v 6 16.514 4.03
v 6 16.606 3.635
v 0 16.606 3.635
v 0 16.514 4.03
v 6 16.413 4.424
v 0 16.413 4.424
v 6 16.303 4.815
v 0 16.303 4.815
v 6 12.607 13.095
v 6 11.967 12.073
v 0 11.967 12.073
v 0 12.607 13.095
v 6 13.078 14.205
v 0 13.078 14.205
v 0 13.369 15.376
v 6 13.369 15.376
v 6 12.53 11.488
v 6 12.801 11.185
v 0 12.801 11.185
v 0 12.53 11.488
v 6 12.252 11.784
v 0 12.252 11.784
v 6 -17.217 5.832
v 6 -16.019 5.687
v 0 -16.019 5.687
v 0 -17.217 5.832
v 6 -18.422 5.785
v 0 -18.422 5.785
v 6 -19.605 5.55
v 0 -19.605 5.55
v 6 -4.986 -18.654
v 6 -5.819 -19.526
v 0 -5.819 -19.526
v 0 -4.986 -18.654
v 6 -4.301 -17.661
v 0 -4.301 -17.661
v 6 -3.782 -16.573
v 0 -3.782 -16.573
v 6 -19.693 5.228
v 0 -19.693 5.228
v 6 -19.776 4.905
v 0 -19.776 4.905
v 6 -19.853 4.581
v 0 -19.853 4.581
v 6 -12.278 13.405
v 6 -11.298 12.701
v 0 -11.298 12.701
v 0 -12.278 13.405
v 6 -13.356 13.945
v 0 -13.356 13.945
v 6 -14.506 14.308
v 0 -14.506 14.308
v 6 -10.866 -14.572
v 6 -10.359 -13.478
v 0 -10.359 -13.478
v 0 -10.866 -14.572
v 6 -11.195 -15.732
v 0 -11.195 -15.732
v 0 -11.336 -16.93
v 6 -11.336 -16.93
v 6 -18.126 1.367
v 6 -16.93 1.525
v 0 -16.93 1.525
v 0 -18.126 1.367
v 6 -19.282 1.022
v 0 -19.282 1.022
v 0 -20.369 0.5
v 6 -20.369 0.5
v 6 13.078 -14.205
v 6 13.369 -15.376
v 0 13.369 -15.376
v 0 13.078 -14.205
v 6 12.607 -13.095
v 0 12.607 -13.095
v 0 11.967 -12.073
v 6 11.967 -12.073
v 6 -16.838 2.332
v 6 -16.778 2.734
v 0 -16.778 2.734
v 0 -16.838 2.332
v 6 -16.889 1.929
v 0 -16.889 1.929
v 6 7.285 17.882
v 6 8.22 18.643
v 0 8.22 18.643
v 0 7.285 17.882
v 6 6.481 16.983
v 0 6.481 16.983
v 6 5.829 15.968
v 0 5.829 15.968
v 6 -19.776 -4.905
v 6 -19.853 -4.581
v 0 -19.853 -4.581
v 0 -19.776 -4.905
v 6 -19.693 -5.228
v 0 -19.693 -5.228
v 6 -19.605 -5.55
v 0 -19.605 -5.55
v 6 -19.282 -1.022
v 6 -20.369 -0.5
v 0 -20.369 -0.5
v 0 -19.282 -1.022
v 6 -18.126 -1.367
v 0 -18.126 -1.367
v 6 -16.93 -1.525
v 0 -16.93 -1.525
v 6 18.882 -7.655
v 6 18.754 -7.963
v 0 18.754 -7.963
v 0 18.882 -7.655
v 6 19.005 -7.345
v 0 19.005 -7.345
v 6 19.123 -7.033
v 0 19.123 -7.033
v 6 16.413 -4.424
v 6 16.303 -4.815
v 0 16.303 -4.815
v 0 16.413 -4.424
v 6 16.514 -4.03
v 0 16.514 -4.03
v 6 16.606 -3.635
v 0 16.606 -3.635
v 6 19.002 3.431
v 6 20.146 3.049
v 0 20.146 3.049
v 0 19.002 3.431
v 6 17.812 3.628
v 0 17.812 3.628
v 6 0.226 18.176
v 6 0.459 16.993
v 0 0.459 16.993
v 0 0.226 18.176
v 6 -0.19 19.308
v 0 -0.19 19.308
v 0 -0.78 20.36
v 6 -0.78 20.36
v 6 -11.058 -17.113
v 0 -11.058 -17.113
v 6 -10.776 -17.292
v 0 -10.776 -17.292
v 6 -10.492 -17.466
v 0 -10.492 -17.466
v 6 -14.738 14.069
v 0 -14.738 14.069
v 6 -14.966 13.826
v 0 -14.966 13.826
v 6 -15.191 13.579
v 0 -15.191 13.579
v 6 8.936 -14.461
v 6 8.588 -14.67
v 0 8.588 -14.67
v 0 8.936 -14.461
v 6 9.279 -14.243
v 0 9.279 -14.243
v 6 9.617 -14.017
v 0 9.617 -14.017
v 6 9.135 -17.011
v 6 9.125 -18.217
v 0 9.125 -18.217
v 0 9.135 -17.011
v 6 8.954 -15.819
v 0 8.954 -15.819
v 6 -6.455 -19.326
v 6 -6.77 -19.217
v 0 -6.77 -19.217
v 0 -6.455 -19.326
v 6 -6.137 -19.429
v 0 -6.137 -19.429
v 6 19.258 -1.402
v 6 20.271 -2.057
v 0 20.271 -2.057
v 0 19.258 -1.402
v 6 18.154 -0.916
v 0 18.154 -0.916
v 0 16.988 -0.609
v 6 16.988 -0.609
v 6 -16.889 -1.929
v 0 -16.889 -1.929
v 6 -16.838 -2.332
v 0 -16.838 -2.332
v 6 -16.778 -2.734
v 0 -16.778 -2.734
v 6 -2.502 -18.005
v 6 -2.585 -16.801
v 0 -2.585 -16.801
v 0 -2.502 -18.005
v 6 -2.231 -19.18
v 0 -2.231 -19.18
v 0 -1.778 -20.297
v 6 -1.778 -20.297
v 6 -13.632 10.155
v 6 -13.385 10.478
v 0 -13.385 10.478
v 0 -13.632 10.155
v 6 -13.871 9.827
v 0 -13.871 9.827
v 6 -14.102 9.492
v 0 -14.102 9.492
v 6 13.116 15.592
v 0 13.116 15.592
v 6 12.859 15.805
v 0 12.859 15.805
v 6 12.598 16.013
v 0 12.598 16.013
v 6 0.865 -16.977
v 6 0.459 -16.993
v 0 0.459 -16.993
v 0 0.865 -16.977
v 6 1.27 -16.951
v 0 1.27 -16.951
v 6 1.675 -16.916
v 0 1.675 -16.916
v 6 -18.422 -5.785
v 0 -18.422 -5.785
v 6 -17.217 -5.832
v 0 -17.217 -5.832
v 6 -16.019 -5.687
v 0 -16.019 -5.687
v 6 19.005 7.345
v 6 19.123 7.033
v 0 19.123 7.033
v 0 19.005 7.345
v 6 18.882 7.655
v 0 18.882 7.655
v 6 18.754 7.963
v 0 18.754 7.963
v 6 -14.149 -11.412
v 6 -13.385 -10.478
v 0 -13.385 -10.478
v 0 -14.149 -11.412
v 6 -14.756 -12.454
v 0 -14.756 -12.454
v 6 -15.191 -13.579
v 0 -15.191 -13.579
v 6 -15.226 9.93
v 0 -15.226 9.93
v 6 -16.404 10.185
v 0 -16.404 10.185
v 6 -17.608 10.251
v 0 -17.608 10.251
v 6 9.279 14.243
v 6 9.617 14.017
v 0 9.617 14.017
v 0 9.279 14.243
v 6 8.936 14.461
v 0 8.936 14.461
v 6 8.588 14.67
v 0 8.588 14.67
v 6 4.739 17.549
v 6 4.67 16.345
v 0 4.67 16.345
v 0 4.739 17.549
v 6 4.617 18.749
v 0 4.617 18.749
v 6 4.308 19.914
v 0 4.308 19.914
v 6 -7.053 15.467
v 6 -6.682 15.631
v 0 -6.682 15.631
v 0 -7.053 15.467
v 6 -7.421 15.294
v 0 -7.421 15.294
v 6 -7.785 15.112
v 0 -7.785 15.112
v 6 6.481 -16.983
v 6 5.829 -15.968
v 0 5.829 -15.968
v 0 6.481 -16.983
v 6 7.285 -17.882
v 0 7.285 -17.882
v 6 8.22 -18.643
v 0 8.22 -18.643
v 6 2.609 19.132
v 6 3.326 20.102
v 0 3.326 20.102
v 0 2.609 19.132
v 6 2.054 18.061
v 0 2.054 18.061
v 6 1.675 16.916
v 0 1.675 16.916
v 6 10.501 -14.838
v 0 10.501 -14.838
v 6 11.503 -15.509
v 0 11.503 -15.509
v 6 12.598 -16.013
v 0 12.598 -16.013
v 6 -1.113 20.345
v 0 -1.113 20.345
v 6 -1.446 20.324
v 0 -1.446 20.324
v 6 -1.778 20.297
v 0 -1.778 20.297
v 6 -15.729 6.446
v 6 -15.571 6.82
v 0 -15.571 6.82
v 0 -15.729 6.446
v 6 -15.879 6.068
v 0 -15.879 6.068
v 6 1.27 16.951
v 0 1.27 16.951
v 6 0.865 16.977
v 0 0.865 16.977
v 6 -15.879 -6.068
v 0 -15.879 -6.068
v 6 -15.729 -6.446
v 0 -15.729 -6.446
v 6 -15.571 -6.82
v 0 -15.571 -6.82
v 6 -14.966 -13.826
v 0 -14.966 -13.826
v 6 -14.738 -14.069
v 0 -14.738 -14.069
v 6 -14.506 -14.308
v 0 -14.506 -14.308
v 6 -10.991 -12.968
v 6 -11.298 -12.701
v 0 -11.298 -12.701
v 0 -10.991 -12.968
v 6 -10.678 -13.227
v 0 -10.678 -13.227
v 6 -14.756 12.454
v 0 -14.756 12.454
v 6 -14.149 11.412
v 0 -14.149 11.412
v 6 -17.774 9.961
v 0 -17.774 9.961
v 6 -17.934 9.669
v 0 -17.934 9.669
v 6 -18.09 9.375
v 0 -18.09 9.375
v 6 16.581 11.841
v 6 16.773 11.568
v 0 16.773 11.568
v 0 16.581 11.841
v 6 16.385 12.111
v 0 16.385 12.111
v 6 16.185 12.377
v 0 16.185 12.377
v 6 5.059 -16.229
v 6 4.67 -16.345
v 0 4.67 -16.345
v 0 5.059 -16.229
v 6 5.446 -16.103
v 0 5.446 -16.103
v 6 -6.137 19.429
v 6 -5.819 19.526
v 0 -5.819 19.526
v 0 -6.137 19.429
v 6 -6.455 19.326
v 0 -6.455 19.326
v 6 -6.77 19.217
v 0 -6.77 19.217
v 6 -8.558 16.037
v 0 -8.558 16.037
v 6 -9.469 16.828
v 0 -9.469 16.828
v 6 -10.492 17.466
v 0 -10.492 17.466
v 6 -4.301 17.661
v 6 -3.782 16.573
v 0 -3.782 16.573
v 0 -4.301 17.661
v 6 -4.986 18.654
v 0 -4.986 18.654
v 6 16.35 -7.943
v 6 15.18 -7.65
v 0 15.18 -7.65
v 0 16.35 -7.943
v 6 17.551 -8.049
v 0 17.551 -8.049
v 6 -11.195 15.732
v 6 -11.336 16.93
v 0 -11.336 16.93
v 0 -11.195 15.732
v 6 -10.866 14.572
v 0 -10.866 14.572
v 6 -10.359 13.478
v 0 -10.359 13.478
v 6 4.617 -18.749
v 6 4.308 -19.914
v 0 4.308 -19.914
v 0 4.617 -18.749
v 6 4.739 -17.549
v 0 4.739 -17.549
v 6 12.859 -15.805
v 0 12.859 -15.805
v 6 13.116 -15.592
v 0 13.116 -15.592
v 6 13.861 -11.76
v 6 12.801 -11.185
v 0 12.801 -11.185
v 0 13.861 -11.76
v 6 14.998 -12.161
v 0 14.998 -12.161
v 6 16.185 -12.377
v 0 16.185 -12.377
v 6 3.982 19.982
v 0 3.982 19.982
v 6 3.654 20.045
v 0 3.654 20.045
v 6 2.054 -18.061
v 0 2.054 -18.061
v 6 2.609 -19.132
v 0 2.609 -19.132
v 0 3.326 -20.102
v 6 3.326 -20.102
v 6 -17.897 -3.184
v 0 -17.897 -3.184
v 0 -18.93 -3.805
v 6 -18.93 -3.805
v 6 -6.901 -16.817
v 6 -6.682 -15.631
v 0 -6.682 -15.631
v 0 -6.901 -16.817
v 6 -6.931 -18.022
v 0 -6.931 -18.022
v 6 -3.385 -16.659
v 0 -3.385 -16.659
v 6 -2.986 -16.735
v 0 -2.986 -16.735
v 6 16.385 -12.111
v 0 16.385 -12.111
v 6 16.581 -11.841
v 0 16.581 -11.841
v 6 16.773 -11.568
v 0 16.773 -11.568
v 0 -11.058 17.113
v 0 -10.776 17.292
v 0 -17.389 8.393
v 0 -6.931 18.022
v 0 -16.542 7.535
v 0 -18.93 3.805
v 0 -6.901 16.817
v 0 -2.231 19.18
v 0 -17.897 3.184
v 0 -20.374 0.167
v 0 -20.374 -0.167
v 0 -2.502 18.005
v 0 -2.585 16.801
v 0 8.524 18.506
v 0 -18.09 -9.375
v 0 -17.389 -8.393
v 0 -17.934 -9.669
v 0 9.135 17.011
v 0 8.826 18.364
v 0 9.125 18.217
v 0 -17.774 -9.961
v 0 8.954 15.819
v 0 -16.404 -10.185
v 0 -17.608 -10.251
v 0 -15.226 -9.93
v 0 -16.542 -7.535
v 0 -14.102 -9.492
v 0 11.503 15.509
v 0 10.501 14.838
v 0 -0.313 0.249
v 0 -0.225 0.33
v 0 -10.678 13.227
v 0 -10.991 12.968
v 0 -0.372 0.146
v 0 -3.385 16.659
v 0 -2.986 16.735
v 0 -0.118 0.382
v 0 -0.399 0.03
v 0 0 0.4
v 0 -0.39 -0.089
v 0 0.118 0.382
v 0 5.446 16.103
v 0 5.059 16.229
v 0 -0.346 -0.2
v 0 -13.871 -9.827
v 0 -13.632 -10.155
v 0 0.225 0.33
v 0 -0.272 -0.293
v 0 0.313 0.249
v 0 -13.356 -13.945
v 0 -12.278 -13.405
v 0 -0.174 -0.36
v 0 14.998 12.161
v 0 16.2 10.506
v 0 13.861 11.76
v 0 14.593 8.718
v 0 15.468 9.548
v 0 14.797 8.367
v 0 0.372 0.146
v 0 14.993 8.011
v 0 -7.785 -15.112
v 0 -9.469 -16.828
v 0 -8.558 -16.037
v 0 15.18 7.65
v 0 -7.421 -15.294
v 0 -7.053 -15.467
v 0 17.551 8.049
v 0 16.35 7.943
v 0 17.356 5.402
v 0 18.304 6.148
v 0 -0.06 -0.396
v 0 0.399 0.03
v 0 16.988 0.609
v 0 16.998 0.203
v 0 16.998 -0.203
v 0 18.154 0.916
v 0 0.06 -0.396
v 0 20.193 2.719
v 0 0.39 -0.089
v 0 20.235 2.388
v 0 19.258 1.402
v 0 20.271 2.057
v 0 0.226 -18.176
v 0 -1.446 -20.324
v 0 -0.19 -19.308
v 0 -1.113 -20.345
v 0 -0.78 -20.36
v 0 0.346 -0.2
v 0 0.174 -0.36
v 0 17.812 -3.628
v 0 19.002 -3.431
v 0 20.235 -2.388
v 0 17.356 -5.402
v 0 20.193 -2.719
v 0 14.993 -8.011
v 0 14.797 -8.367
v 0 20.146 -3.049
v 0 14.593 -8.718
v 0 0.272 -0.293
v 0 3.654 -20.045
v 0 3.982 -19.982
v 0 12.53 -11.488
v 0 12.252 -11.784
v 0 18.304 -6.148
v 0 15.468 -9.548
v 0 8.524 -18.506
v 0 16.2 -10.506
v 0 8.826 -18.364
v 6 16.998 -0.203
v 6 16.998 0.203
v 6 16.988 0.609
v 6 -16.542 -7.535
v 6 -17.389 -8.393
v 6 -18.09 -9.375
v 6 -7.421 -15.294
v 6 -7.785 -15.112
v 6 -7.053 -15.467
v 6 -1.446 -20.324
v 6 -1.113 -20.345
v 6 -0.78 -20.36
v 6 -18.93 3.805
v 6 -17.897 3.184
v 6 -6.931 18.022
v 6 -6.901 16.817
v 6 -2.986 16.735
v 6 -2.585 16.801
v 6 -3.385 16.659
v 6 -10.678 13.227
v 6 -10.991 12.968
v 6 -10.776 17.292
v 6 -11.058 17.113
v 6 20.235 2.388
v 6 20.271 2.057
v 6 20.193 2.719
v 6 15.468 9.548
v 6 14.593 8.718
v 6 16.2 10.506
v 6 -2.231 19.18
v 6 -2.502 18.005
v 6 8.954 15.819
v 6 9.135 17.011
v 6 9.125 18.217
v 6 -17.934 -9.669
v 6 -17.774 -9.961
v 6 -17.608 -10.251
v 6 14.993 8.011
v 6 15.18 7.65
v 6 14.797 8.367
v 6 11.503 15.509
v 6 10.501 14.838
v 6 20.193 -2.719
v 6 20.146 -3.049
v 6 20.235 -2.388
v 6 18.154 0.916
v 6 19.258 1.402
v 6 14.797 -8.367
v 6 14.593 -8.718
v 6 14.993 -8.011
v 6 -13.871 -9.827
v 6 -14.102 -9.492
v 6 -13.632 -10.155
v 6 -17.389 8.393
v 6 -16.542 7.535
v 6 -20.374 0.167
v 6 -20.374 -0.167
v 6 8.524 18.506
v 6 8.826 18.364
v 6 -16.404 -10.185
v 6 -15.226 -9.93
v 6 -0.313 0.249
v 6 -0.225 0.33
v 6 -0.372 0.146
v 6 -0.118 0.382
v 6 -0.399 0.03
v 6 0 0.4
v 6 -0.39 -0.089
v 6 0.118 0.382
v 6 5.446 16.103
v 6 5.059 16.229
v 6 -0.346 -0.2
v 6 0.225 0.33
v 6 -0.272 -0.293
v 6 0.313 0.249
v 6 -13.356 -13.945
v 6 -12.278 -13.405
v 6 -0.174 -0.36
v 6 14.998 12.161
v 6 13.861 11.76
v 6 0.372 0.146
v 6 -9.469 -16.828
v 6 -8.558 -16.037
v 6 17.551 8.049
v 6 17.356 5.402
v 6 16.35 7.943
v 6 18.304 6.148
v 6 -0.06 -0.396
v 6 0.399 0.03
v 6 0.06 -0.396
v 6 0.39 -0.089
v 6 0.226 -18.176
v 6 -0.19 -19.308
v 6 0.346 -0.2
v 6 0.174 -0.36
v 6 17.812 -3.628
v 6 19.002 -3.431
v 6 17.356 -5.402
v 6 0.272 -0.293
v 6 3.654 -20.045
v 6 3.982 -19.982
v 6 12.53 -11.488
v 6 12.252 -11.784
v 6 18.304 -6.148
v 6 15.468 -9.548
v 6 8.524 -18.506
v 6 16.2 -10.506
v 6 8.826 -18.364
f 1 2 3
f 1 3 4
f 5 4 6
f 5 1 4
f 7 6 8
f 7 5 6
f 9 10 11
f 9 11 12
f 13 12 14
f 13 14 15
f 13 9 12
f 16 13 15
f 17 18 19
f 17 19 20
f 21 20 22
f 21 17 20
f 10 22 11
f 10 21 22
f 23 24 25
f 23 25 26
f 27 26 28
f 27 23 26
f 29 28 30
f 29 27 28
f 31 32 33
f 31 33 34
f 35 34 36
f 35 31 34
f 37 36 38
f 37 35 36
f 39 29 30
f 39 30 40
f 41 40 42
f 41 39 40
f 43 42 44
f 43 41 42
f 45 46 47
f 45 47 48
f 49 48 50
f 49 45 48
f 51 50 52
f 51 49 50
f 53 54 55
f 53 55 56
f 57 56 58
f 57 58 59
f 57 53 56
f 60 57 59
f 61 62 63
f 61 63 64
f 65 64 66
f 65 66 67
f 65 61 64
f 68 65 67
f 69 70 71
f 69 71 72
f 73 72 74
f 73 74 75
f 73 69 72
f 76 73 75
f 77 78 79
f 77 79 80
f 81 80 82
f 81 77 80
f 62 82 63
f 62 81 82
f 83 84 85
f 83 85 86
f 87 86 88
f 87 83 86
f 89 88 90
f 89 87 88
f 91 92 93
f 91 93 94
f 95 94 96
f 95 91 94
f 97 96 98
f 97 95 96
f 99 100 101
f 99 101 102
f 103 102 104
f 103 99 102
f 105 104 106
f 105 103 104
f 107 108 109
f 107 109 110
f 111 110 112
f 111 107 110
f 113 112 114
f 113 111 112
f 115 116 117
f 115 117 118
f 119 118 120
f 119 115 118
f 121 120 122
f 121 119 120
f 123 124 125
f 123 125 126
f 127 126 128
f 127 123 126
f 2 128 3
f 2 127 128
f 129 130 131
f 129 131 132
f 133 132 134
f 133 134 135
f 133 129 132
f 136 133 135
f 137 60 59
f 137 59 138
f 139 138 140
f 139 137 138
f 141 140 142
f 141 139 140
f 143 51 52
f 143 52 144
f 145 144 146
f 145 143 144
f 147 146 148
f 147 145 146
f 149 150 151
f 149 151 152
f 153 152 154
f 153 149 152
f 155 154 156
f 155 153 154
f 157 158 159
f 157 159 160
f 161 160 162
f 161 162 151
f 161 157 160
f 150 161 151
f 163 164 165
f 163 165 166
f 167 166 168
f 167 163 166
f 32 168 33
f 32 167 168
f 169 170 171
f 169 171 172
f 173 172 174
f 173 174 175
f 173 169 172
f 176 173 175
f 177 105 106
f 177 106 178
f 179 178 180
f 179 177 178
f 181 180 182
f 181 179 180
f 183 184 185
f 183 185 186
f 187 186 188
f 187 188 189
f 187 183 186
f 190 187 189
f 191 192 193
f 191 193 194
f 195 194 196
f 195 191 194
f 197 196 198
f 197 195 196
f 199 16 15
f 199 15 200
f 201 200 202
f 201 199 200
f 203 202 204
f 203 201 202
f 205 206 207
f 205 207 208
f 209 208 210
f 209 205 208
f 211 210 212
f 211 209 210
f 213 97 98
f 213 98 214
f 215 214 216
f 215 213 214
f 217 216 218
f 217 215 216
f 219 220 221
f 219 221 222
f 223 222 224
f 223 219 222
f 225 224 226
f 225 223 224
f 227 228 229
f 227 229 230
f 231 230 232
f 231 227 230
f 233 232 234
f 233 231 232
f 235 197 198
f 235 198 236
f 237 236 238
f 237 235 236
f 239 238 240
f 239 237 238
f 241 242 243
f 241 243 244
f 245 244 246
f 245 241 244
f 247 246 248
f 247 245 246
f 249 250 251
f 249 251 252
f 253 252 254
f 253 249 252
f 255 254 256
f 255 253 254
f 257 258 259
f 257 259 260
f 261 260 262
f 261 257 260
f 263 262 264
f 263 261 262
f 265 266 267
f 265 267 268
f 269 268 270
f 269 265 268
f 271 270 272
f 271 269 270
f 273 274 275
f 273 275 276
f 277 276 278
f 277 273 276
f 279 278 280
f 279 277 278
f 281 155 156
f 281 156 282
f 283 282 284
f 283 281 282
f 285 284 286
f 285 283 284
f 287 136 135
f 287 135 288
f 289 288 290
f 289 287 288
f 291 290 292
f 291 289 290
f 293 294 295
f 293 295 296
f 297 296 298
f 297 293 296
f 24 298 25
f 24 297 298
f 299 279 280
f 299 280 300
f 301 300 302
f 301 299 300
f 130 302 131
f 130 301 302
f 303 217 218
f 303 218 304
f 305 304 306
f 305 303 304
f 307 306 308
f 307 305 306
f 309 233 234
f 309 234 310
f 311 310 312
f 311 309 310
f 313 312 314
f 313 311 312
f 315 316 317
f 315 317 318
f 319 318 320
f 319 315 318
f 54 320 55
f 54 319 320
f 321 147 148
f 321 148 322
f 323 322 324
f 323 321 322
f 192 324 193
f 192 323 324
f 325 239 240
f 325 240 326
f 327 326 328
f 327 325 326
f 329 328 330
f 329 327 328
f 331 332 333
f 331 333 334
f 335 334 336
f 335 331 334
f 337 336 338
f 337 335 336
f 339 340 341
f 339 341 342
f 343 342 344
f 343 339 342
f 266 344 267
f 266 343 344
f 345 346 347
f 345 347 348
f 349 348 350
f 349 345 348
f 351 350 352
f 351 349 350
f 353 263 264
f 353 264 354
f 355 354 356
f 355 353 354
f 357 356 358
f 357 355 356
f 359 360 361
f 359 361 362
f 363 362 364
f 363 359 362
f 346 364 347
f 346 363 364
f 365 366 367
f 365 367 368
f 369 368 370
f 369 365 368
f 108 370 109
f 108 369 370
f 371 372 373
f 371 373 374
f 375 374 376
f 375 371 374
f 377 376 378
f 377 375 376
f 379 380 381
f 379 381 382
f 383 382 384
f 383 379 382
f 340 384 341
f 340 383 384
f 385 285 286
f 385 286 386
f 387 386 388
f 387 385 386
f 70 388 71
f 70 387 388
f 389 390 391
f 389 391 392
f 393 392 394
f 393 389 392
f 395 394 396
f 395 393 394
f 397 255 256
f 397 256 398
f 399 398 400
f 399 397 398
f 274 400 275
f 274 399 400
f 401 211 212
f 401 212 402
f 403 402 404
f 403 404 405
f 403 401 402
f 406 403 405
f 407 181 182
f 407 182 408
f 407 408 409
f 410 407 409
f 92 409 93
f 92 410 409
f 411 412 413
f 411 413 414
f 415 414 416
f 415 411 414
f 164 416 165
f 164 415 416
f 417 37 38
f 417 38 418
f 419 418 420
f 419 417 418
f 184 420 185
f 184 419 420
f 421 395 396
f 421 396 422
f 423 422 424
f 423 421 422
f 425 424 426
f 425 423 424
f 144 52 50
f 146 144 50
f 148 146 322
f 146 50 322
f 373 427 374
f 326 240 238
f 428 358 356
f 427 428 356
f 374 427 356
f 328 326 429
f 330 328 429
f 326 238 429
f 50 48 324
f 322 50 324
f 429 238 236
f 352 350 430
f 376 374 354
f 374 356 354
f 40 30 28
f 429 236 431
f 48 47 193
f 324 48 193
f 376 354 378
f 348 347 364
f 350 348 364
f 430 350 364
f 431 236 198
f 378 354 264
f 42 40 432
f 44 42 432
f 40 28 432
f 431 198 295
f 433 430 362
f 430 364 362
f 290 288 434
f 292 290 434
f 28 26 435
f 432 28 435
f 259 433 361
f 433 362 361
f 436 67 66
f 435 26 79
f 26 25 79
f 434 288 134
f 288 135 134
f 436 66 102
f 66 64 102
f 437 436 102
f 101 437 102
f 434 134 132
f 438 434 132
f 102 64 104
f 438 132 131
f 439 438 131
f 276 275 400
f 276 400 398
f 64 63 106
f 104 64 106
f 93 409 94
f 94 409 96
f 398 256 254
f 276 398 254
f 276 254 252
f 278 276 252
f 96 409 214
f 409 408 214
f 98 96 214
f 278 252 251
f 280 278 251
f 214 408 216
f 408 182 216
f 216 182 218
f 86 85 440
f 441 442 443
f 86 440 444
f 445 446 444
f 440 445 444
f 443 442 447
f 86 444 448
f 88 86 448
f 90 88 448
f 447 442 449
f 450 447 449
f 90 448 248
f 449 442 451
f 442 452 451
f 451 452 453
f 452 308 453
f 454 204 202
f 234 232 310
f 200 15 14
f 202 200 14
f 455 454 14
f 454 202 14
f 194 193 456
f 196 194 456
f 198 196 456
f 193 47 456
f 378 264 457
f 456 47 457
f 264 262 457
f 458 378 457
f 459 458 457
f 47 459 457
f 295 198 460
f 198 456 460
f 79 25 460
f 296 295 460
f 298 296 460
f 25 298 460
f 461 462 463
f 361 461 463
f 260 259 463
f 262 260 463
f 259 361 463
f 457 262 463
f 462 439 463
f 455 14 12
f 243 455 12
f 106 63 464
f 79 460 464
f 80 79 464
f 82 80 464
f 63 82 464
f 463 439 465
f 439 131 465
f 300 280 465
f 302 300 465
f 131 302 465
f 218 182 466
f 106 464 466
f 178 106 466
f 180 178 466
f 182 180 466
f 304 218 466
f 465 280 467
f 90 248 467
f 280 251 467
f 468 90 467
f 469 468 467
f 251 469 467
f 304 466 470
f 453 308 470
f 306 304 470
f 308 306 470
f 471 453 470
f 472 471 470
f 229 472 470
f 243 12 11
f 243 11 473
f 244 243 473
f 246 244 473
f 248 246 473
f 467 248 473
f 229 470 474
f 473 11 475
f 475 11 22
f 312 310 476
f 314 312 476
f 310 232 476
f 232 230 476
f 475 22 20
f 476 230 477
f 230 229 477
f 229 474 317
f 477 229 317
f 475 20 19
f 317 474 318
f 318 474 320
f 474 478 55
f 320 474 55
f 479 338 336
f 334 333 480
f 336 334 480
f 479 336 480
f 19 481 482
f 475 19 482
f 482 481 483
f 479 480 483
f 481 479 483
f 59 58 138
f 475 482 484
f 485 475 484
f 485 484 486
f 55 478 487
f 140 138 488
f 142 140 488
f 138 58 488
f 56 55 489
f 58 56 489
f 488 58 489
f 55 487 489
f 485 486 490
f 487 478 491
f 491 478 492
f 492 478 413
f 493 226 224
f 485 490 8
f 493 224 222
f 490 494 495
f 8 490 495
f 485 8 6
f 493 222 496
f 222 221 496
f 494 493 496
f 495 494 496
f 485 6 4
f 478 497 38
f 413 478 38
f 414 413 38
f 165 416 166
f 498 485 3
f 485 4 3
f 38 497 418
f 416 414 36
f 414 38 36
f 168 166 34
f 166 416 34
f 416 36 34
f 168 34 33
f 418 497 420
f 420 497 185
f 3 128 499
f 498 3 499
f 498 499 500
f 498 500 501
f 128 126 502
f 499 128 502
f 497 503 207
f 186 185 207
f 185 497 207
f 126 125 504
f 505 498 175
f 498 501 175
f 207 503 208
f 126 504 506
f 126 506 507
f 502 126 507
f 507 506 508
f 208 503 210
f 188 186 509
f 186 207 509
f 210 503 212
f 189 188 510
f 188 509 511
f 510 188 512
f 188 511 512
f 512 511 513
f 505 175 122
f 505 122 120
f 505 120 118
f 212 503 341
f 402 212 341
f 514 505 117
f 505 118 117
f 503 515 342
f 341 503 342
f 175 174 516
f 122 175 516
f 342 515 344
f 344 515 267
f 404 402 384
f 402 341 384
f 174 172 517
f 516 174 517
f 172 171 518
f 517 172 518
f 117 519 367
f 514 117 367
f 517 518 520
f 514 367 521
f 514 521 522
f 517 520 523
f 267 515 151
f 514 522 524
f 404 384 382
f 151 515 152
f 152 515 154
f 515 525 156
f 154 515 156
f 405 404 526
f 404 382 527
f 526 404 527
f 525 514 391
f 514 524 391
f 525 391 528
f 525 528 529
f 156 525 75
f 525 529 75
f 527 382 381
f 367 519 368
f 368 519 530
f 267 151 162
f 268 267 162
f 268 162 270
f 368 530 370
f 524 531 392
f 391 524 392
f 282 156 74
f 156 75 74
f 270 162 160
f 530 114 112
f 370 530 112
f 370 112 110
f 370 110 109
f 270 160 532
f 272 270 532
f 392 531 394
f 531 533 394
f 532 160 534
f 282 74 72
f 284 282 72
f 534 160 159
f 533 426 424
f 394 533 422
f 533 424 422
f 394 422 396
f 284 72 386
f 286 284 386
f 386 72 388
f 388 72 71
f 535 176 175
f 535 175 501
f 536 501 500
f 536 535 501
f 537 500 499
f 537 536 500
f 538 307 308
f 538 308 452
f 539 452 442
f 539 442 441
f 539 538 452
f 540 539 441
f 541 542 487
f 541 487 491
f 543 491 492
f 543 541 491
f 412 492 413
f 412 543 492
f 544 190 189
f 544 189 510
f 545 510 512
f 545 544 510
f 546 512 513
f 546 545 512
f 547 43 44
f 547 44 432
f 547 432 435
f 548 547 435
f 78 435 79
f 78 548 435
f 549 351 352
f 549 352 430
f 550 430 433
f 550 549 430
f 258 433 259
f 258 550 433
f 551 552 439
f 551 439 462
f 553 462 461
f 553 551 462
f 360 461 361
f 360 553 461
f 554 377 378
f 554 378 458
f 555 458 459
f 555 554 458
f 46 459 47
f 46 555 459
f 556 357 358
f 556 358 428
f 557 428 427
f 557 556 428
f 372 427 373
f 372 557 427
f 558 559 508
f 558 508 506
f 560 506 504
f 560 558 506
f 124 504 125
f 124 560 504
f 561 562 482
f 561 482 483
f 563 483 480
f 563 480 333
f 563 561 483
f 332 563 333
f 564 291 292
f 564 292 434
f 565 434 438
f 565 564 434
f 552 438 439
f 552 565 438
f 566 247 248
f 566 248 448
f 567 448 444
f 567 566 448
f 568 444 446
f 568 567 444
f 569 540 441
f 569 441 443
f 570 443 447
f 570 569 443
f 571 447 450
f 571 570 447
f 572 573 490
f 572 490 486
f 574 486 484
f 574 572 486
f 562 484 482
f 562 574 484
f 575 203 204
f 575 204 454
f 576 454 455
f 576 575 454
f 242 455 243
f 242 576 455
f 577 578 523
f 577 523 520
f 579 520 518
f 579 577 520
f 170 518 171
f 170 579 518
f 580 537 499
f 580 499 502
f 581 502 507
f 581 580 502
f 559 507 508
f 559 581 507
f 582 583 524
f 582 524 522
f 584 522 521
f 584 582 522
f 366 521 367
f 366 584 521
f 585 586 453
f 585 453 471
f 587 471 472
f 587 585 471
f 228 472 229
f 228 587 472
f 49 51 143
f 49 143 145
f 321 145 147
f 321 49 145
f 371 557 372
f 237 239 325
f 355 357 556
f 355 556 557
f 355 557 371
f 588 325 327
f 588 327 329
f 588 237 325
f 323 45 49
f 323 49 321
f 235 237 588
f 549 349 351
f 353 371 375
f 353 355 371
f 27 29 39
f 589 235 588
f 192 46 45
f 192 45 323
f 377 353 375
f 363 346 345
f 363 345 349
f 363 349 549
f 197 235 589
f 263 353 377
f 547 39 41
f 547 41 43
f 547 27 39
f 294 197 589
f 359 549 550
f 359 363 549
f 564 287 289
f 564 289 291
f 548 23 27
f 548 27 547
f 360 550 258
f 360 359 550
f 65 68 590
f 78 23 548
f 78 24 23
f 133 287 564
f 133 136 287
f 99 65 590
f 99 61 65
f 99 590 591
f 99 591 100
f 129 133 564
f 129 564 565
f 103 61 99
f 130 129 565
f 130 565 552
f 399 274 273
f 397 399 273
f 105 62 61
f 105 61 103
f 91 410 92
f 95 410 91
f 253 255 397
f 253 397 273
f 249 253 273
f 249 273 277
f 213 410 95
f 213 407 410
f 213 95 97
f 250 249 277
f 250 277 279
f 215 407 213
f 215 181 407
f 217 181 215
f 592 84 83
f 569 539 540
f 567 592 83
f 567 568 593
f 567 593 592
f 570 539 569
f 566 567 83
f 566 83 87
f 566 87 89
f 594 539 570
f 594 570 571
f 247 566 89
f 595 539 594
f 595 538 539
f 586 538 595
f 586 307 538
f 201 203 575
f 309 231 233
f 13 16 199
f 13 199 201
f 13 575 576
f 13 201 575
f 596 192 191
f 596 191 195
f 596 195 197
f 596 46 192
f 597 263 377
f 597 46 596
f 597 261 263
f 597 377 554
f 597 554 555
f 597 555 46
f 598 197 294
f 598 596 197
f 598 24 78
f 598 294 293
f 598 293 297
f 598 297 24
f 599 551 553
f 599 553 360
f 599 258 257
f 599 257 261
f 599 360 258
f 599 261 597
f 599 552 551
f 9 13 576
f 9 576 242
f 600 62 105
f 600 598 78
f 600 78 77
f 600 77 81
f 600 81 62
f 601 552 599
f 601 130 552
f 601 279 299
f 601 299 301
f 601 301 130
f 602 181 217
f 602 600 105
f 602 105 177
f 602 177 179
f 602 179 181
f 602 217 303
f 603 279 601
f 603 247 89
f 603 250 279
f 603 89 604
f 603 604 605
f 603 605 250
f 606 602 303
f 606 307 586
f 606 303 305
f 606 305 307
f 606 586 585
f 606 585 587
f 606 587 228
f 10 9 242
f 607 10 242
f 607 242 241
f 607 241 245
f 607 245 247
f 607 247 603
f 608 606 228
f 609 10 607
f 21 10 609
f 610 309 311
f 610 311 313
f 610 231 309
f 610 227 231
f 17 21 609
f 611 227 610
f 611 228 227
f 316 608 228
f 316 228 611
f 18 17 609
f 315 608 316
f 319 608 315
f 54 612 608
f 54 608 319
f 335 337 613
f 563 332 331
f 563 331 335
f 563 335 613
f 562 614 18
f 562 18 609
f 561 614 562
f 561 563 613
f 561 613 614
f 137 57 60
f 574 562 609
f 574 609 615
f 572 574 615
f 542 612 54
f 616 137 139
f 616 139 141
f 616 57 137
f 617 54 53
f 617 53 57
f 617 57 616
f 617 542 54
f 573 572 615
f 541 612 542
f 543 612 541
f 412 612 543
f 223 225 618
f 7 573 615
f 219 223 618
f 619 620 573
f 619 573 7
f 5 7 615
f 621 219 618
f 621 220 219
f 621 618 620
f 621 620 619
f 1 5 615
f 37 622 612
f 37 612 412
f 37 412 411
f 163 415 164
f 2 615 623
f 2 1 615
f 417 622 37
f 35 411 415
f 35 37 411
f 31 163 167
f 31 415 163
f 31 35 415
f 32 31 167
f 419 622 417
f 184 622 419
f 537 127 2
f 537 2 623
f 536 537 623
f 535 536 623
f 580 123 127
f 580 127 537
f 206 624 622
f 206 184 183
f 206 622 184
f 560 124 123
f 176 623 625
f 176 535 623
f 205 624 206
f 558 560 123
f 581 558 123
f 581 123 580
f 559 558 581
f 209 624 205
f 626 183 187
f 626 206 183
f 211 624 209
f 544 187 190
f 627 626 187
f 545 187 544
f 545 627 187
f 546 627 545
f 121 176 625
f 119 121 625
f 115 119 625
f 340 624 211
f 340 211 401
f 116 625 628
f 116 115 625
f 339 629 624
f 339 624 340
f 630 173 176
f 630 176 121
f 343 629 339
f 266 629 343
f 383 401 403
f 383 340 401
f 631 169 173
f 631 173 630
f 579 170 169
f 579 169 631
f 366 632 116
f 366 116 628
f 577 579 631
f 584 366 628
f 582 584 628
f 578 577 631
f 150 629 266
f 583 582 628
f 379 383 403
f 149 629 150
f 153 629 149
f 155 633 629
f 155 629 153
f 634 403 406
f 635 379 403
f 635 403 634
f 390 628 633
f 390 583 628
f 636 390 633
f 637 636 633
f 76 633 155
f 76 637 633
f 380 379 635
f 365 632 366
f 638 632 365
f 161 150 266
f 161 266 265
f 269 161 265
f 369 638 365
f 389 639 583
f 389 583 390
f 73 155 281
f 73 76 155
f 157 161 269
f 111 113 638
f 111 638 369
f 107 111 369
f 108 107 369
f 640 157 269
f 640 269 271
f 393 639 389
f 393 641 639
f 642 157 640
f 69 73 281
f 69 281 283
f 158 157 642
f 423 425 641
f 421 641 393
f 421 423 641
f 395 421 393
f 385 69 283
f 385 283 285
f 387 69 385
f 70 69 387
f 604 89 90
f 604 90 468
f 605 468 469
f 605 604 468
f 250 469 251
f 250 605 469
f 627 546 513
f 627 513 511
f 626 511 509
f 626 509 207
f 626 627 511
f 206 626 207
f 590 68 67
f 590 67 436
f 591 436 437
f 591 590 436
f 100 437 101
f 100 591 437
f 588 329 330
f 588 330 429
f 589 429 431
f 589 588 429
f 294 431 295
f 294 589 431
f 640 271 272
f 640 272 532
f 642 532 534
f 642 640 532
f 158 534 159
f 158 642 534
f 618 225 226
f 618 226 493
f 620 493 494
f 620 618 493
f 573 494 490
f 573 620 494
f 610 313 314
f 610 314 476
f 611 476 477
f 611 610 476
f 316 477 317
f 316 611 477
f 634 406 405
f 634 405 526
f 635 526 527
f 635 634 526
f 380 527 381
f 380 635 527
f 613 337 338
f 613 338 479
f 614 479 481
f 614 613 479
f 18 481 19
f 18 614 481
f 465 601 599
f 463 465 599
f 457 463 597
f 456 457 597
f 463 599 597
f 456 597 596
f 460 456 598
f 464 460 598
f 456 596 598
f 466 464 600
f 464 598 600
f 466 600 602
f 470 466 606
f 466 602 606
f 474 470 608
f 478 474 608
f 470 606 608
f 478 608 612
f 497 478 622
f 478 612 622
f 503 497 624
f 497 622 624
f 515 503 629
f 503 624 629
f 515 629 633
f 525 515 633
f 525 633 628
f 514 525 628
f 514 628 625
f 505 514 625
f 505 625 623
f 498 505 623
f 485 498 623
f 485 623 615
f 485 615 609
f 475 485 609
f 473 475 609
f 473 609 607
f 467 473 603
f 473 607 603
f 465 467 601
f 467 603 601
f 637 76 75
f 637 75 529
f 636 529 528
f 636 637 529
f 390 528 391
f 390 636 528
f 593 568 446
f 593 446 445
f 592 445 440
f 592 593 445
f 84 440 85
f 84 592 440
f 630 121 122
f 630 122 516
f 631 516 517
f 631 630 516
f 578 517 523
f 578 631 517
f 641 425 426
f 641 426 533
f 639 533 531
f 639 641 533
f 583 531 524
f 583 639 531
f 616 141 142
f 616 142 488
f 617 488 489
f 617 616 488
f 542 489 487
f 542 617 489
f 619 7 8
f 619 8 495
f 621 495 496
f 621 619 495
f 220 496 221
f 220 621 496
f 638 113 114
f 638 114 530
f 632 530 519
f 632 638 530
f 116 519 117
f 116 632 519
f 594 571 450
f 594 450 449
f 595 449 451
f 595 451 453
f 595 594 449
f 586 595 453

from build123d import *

# Parameters (mm, degrees)
BASPROSKE_W         = 6
BASPROSKE_H         = 20.25
TOOTHCUT_DEPTH      = 30.259613805
TEETHCUTS_COUNT     = 25
TEETHCUTS_ANGLE     = 345.6
BORSKE_R            = 0.4
BORE_DEPTH          = 50.0000508
SKETCH1_R           = 0.4
BOSS_EXTRUDE1_DEPTH = 6


with BuildPart() as part:
    # BasProSke → Base-Revolve (revolve)
    with BuildSketch(Plane(origin=(0, 0, 0), x_dir=(1, 0, 0), z_dir=(0, 1, 0)), mode=Mode.PRIVATE) as base_revolve_sk:
        with Locations((3, 10.125)):
            Rectangle(BASPROSKE_W, BASPROSKE_H)
    revolve(base_revolve_sk.sketch.rotate(Axis((-10, 0, 0), (1, 0, 0)), 180), axis=Axis((-10, 0, 0), (1, 0, 0)))

    # TooCutSke → ToothCut (cut, through all)
    with BuildSketch(Plane(origin=(0, 0, 0), x_dir=(0, 0, -1), z_dir=(1, 0, 0))):
        with BuildLine():
            ThreePointArc((0.713909619, 16.858891098), (0, 16.874), (-0.713909619, 16.858891098))
            ThreePointArc((-0.713909619, 16.858891098), (-1.221902209, 18.597177626), (-2.131751691, 20.163022588))
            ThreePointArc((-2.131751691, 20.163022588), (0, 20.2754), (2.131751691, 20.163022588))
            ThreePointArc((2.131751691, 20.163022588), (1.221902209, 18.597177626), (0.713909619, 16.858891098))
        make_face()
    toothcut = extrude(amount=TOOTHCUT_DEPTH, mode=Mode.SUBTRACT)

    # TeethCuts: ToothCut ×25 about axis
    teethcuts_axis = Axis((-10, 0, 0), (1, 0, 0))
    for i in range(1, TEETHCUTS_COUNT):
        add(toothcut.rotate(teethcuts_axis, i * TEETHCUTS_ANGLE / (TEETHCUTS_COUNT - 1)), mode=Mode.SUBTRACT)

    # BorSke → Bore (cut, symmetric)
    with BuildSketch(Plane(origin=(0, 0, 0), x_dir=(0, 0, -1), z_dir=(1, 0, 0))):
        with Locations(Location((0, 0, 0), (0, 0, 180))):
            Circle(BORSKE_R)
    extrude(amount=BORE_DEPTH, both=True, mode=Mode.SUBTRACT)

    # Sketch1 → Boss-Extrude1 (add)
    with BuildSketch(Plane(origin=(6, 0, 0), x_dir=(0, 0, -1), z_dir=(1, 0, 0))):
        with BuildLine():
            ThreePointArc((7.033321313, 19.122578704), (5.755923301, 17.845039552), (4.814939591, 16.302832813))
            ThreePointArc((4.814939591, 16.302832813), (4.227479392, 16.464945156), (3.634585878, 16.605896136))
            ThreePointArc((3.634585878, 16.605896136), (3.55295933, 18.410664563), (3.049026099, 20.145571842))
            ThreePointArc((3.049026099, 20.145571842), (2.553664634, 20.214337039), (2.056764651, 20.270923614))
            ThreePointArc((2.056764651, 20.270923614), (1.137209513, 18.715844736), (0.609319757, 16.988076125))
            ThreePointArc((0.609319757, 16.988076125), (0, 16.999), (-0.609319757, 16.988076125))
            ThreePointArc((-0.609319757, 16.988076125), (-1.137209513, 18.715844736), (-2.056764651, 20.270923614))
            ThreePointArc((-2.056764651, 20.270923614), (-2.553664634, 20.214337039), (-3.049026099, 20.145571842))
            ThreePointArc((-3.049026099, 20.145571842), (-3.55295933, 18.410664563), (-3.634585878, 16.605896136))
            ThreePointArc((-3.634585878, 16.605896136), (-4.227479392, 16.464945156), (-4.814939591, 16.302832813))
            ThreePointArc((-4.814939591, 16.302832813), (-5.755923301, 17.845039552), (-7.033321313, 19.122578704))
            ThreePointArc((-7.033321313, 19.122578704), (-7.500537761, 18.9441959), (-7.963235326, 18.754399701))
            ThreePointArc((-7.963235326, 18.754399701), (-8.019882673, 16.948674626), (-7.650117116, 15.180306621))
            ThreePointArc((-7.650117116, 15.180306621), (-8.189330706, 14.896337254), (-8.718019063, 14.593222558))
            ThreePointArc((-8.718019063, 14.593222558), (-10.012971259, 15.852964904), (-11.567948531, 16.772691847))
            ThreePointArc((-11.567948531, 16.772691847), (-11.976124515, 16.48372126), (-12.37708519, 16.184819653))
            ThreePointArc((-12.37708519, 16.184819653), (-11.982887291, 14.421737129), (-11.18496336, 12.800882612))
            ThreePointArc((-11.18496336, 12.800882612), (-11.636616254, 12.391737698), (-12.073313334, 11.966666459))
            ThreePointArc((-12.073313334, 11.966666459), (-13.640867407, 12.864790167), (-15.375718999, 13.368915074))
            ThreePointArc((-15.375718999, 13.368915074), (-15.699207322, 12.987513791), (-16.013237272, 12.598287862))
            ThreePointArc((-16.013237272, 12.598287862), (-15.192963031, 10.988628849), (-14.01701722, 9.61713207))
            ThreePointArc((-14.01701722, 9.61713207), (-14.352730406, 9.108519688), (-14.669996926, 8.588200696))
            ThreePointArc((-14.669996926, 8.588200696), (-16.411657689, 9.068273351), (-18.217376494, 9.125120201))
            ThreePointArc((-18.217376494, 9.125120201), (-18.435851194, 8.675253066), (-18.643218764, 8.220159312))
            ThreePointArc((-18.643218764, 8.220159312), (-17.448409029, 6.865064605), (-15.968330338, 5.82910175))
            ThreePointArc((-15.968330338, 5.82910175), (-16.167009721, 5.252979887), (-16.344910658, 4.670106699))
            ThreePointArc((-16.344910658, 4.670106699), (-18.15124316, 4.70196357), (-19.914369225, 4.307960465))
            ThreePointArc((-19.914369225, 4.307960465), (-20.014102734, 3.817894285), (-20.101778256, 3.32552792))
            ThreePointArc((-20.101778256, 3.32552792), (-18.607507316, 2.310143104), (-16.916294533, 1.674807529))
            ThreePointArc((-16.916294533, 1.674807529), (-16.965456357, 1.067376041), (-16.992813542, 0.458572722))
            ThreePointArc((-16.992813542, 0.458572722), (-18.750319268, 0.040212124), (-20.360068898, -0.77988427))
            ThreePointArc((-20.360068898, -0.77988427), (-20.334794592, -1.279356835), (-20.297269091, -1.778058621))
            ThreePointArc((-20.297269091, -1.778058621), (-18.597427484, -2.389933184), (-16.801345729, -2.584721008))
            ThreePointArc((-16.801345729, -2.584721008), (-16.697900975, -3.185294967), (-16.572995455, -3.781775066))
            ThreePointArc((-16.572995455, -3.781775066), (-18.171243857, -4.624065996), (-19.526470563, -5.818726009))
            ThreePointArc((-19.526470563, -5.818726009), (-19.37777652, -6.29622126), (-19.21740786, -6.769923199))
            ThreePointArc((-19.21740786, -6.769923199), (-17.418802888, -6.939841181), (-15.630706582, -6.681842018))
            ThreePointArc((-15.630706582, -6.681842018), (-15.381155065, -7.237822177), (-15.111835113, -7.784500017))
            ThreePointArc((-15.111835113, -7.784500017), (-16.450402366, -8.997797045), (-17.465952269, -10.491955792))
            ThreePointArc((-17.465952269, -10.491955792), (-17.203181482, -10.917470948), (-16.930046218, -11.336408605))
            ThreePointArc((-16.930046218, -11.336408605), (-15.145690844, -11.053693433), (-13.477932654, -10.35911832))
            ThreePointArc((-13.477932654, -10.35911832), (-13.097954614, -10.835570402), (-12.701142593, -11.298096204))
            ThreePointArc((-12.701142593, -11.298096204), (-13.695921594, -12.806163413), (-14.307983958, -14.505937407))
            ThreePointArc((-14.307983958, -14.505937407), (-13.947647283, -14.852735784), (-13.578907507, -15.190585766))
            ThreePointArc((-13.578907507, -15.190585766), (-11.920919342, -14.473001475), (-10.47829065, -13.38549312))
            ThreePointArc((-10.47829065, -13.38549312), (-9.991761504, -13.752479887), (-9.492390573, -14.101791454))
            ThreePointArc((-9.492390573, -14.101791454), (-10.080875698, -15.809871436), (-10.250992395, -17.608457625))
            ThreePointArc((-10.250992395, -17.608457625), (-9.81573111, -17.854748606), (-9.374556097, -18.090282557))
            ThreePointArc((-9.374556097, -18.090282557), (-7.947112637, -16.982917606), (-6.820259107, -15.570808159))
            ThreePointArc((-6.820259107, -15.570808159), (-6.257749271, -15.805270484), (-5.687196742, -16.019419285))
            ThreePointArc((-5.687196742, -16.019419285), (-5.832411307, -17.820187093), (-5.549893279, -19.604573691))
            ThreePointArc((-5.549893279, -19.604573691), (-5.067056451, -19.734881908), (-4.581166851, -19.853300363))
            ThreePointArc((-4.581166851, -19.853300363), (-3.473959616, -18.425734565), (-2.733685602, -16.777752055))
            ThreePointArc((-2.733685602, -16.777752055), (-2.130539637, -16.864957808), (-1.524655424, -16.930488086))
            ThreePointArc((-1.524655424, -16.930488086), (-1.217475063, -18.710794856), (-0.500073957, -20.368862291))
            ThreePointArc((-0.500073957, -20.368862291), (0, -20.375), (0.500073957, -20.368862291))
            ThreePointArc((0.500073957, -20.368862291), (1.217475063, -18.710794856), (1.524655424, -16.930488086))
            ThreePointArc((1.524655424, -16.930488086), (2.130539637, -16.864957808), (2.733685602, -16.777752055))
            ThreePointArc((2.733685602, -16.777752055), (3.473959616, -18.425734565), (4.581166851, -19.853300363))
            ThreePointArc((4.581166851, -19.853300363), (5.067056451, -19.734881908), (5.549893279, -19.604573691))
            ThreePointArc((5.549893279, -19.604573691), (5.832411307, -17.820187093), (5.687196742, -16.019419285))
            ThreePointArc((5.687196742, -16.019419285), (6.257749271, -15.805270484), (6.820259107, -15.570808159))
            ThreePointArc((6.820259107, -15.570808159), (7.947112637, -16.982917606), (9.374556097, -18.090282557))
            ThreePointArc((9.374556097, -18.090282557), (9.81573111, -17.854748606), (10.250992395, -17.608457625))
            ThreePointArc((10.250992395, -17.608457625), (10.080875698, -15.809871436), (9.492390573, -14.101791454))
            ThreePointArc((9.492390573, -14.101791454), (9.991761504, -13.752479887), (10.47829065, -13.38549312))
            ThreePointArc((10.47829065, -13.38549312), (11.920919342, -14.473001475), (13.578907507, -15.190585766))
            ThreePointArc((13.578907507, -15.190585766), (13.947647283, -14.852735784), (14.307983958, -14.505937407))
            ThreePointArc((14.307983958, -14.505937407), (13.695921594, -12.806163413), (12.701142593, -11.298096204))
            ThreePointArc((12.701142593, -11.298096204), (13.097954614, -10.835570402), (13.477932654, -10.35911832))
            ThreePointArc((13.477932654, -10.35911832), (15.145690844, -11.053693433), (16.930046218, -11.336408605))
            ThreePointArc((16.930046218, -11.336408605), (17.203181482, -10.917470948), (17.465952269, -10.491955792))
            ThreePointArc((17.465952269, -10.491955792), (16.450402366, -8.997797045), (15.111835113, -7.784500017))
            ThreePointArc((15.111835113, -7.784500017), (15.381155065, -7.237822177), (15.630706582, -6.681842018))
            ThreePointArc((15.630706582, -6.681842018), (17.418802888, -6.939841181), (19.21740786, -6.769923199))
            ThreePointArc((19.21740786, -6.769923199), (19.37777652, -6.29622126), (19.526470563, -5.818726009))
            ThreePointArc((19.526470563, -5.818726009), (18.171243857, -4.624065996), (16.572995455, -3.781775066))
            ThreePointArc((16.572995455, -3.781775066), (16.697900975, -3.185294967), (16.801345729, -2.584721008))
            ThreePointArc((16.801345729, -2.584721008), (18.597427484, -2.389933184), (20.297269091, -1.778058621))
            ThreePointArc((20.297269091, -1.778058621), (20.334794592, -1.279356835), (20.360068898, -0.77988427))
            ThreePointArc((20.360068898, -0.77988427), (18.750319268, 0.040212124), (16.992813542, 0.458572722))
            ThreePointArc((16.992813542, 0.458572722), (16.965456357, 1.067376041), (16.916294533, 1.674807529))
            ThreePointArc((16.916294533, 1.674807529), (18.607507316, 2.310143104), (20.101778256, 3.32552792))
            ThreePointArc((20.101778256, 3.32552792), (20.014102734, 3.817894285), (19.914369225, 4.307960465))
            ThreePointArc((19.914369225, 4.307960465), (18.15124316, 4.70196357), (16.344910658, 4.670106699))
            ThreePointArc((16.344910658, 4.670106699), (16.167009721, 5.252979887), (15.968330338, 5.82910175))
            ThreePointArc((15.968330338, 5.82910175), (17.448409029, 6.865064605), (18.643218764, 8.220159312))
            ThreePointArc((18.643218764, 8.220159312), (18.435851194, 8.675253066), (18.217376494, 9.125120201))
            ThreePointArc((18.217376494, 9.125120201), (16.411657689, 9.068273351), (14.669996926, 8.588200696))
            ThreePointArc((14.669996926, 8.588200696), (14.352730406, 9.108519688), (14.01701722, 9.61713207))
            ThreePointArc((14.01701722, 9.61713207), (15.192963031, 10.988628849), (16.013237272, 12.598287862))
            ThreePointArc((16.013237272, 12.598287862), (15.699207322, 12.987513791), (15.375718999, 13.368915074))
            ThreePointArc((15.375718999, 13.368915074), (13.640867407, 12.864790167), (12.073313334, 11.966666459))
            ThreePointArc((12.073313334, 11.966666459), (11.636616254, 12.391737698), (11.18496336, 12.800882612))
            ThreePointArc((11.18496336, 12.800882612), (11.982887291, 14.421737129), (12.37708519, 16.184819653))
            ThreePointArc((12.37708519, 16.184819653), (11.976124515, 16.48372126), (11.567948531, 16.772691847))
            ThreePointArc((11.567948531, 16.772691847), (10.012971259, 15.852964904), (8.718019063, 14.593222558))
            ThreePointArc((8.718019063, 14.593222558), (8.189330706, 14.896337254), (7.650117116, 15.180306621))
            ThreePointArc((7.650117116, 15.180306621), (8.019882673, 16.948674626), (7.963235326, 18.754399701))
            ThreePointArc((7.963235326, 18.754399701), (7.500537761, 18.9441959), (7.033321313, 19.122578704))
        make_face()
        with Locations(Location((0, 0, 0), (0, 0, 180))):
            Circle(SKETCH1_R, mode=Mode.SUBTRACT)
    extrude(amount=-BOSS_EXTRUDE1_DEPTH)


solid = part.part
